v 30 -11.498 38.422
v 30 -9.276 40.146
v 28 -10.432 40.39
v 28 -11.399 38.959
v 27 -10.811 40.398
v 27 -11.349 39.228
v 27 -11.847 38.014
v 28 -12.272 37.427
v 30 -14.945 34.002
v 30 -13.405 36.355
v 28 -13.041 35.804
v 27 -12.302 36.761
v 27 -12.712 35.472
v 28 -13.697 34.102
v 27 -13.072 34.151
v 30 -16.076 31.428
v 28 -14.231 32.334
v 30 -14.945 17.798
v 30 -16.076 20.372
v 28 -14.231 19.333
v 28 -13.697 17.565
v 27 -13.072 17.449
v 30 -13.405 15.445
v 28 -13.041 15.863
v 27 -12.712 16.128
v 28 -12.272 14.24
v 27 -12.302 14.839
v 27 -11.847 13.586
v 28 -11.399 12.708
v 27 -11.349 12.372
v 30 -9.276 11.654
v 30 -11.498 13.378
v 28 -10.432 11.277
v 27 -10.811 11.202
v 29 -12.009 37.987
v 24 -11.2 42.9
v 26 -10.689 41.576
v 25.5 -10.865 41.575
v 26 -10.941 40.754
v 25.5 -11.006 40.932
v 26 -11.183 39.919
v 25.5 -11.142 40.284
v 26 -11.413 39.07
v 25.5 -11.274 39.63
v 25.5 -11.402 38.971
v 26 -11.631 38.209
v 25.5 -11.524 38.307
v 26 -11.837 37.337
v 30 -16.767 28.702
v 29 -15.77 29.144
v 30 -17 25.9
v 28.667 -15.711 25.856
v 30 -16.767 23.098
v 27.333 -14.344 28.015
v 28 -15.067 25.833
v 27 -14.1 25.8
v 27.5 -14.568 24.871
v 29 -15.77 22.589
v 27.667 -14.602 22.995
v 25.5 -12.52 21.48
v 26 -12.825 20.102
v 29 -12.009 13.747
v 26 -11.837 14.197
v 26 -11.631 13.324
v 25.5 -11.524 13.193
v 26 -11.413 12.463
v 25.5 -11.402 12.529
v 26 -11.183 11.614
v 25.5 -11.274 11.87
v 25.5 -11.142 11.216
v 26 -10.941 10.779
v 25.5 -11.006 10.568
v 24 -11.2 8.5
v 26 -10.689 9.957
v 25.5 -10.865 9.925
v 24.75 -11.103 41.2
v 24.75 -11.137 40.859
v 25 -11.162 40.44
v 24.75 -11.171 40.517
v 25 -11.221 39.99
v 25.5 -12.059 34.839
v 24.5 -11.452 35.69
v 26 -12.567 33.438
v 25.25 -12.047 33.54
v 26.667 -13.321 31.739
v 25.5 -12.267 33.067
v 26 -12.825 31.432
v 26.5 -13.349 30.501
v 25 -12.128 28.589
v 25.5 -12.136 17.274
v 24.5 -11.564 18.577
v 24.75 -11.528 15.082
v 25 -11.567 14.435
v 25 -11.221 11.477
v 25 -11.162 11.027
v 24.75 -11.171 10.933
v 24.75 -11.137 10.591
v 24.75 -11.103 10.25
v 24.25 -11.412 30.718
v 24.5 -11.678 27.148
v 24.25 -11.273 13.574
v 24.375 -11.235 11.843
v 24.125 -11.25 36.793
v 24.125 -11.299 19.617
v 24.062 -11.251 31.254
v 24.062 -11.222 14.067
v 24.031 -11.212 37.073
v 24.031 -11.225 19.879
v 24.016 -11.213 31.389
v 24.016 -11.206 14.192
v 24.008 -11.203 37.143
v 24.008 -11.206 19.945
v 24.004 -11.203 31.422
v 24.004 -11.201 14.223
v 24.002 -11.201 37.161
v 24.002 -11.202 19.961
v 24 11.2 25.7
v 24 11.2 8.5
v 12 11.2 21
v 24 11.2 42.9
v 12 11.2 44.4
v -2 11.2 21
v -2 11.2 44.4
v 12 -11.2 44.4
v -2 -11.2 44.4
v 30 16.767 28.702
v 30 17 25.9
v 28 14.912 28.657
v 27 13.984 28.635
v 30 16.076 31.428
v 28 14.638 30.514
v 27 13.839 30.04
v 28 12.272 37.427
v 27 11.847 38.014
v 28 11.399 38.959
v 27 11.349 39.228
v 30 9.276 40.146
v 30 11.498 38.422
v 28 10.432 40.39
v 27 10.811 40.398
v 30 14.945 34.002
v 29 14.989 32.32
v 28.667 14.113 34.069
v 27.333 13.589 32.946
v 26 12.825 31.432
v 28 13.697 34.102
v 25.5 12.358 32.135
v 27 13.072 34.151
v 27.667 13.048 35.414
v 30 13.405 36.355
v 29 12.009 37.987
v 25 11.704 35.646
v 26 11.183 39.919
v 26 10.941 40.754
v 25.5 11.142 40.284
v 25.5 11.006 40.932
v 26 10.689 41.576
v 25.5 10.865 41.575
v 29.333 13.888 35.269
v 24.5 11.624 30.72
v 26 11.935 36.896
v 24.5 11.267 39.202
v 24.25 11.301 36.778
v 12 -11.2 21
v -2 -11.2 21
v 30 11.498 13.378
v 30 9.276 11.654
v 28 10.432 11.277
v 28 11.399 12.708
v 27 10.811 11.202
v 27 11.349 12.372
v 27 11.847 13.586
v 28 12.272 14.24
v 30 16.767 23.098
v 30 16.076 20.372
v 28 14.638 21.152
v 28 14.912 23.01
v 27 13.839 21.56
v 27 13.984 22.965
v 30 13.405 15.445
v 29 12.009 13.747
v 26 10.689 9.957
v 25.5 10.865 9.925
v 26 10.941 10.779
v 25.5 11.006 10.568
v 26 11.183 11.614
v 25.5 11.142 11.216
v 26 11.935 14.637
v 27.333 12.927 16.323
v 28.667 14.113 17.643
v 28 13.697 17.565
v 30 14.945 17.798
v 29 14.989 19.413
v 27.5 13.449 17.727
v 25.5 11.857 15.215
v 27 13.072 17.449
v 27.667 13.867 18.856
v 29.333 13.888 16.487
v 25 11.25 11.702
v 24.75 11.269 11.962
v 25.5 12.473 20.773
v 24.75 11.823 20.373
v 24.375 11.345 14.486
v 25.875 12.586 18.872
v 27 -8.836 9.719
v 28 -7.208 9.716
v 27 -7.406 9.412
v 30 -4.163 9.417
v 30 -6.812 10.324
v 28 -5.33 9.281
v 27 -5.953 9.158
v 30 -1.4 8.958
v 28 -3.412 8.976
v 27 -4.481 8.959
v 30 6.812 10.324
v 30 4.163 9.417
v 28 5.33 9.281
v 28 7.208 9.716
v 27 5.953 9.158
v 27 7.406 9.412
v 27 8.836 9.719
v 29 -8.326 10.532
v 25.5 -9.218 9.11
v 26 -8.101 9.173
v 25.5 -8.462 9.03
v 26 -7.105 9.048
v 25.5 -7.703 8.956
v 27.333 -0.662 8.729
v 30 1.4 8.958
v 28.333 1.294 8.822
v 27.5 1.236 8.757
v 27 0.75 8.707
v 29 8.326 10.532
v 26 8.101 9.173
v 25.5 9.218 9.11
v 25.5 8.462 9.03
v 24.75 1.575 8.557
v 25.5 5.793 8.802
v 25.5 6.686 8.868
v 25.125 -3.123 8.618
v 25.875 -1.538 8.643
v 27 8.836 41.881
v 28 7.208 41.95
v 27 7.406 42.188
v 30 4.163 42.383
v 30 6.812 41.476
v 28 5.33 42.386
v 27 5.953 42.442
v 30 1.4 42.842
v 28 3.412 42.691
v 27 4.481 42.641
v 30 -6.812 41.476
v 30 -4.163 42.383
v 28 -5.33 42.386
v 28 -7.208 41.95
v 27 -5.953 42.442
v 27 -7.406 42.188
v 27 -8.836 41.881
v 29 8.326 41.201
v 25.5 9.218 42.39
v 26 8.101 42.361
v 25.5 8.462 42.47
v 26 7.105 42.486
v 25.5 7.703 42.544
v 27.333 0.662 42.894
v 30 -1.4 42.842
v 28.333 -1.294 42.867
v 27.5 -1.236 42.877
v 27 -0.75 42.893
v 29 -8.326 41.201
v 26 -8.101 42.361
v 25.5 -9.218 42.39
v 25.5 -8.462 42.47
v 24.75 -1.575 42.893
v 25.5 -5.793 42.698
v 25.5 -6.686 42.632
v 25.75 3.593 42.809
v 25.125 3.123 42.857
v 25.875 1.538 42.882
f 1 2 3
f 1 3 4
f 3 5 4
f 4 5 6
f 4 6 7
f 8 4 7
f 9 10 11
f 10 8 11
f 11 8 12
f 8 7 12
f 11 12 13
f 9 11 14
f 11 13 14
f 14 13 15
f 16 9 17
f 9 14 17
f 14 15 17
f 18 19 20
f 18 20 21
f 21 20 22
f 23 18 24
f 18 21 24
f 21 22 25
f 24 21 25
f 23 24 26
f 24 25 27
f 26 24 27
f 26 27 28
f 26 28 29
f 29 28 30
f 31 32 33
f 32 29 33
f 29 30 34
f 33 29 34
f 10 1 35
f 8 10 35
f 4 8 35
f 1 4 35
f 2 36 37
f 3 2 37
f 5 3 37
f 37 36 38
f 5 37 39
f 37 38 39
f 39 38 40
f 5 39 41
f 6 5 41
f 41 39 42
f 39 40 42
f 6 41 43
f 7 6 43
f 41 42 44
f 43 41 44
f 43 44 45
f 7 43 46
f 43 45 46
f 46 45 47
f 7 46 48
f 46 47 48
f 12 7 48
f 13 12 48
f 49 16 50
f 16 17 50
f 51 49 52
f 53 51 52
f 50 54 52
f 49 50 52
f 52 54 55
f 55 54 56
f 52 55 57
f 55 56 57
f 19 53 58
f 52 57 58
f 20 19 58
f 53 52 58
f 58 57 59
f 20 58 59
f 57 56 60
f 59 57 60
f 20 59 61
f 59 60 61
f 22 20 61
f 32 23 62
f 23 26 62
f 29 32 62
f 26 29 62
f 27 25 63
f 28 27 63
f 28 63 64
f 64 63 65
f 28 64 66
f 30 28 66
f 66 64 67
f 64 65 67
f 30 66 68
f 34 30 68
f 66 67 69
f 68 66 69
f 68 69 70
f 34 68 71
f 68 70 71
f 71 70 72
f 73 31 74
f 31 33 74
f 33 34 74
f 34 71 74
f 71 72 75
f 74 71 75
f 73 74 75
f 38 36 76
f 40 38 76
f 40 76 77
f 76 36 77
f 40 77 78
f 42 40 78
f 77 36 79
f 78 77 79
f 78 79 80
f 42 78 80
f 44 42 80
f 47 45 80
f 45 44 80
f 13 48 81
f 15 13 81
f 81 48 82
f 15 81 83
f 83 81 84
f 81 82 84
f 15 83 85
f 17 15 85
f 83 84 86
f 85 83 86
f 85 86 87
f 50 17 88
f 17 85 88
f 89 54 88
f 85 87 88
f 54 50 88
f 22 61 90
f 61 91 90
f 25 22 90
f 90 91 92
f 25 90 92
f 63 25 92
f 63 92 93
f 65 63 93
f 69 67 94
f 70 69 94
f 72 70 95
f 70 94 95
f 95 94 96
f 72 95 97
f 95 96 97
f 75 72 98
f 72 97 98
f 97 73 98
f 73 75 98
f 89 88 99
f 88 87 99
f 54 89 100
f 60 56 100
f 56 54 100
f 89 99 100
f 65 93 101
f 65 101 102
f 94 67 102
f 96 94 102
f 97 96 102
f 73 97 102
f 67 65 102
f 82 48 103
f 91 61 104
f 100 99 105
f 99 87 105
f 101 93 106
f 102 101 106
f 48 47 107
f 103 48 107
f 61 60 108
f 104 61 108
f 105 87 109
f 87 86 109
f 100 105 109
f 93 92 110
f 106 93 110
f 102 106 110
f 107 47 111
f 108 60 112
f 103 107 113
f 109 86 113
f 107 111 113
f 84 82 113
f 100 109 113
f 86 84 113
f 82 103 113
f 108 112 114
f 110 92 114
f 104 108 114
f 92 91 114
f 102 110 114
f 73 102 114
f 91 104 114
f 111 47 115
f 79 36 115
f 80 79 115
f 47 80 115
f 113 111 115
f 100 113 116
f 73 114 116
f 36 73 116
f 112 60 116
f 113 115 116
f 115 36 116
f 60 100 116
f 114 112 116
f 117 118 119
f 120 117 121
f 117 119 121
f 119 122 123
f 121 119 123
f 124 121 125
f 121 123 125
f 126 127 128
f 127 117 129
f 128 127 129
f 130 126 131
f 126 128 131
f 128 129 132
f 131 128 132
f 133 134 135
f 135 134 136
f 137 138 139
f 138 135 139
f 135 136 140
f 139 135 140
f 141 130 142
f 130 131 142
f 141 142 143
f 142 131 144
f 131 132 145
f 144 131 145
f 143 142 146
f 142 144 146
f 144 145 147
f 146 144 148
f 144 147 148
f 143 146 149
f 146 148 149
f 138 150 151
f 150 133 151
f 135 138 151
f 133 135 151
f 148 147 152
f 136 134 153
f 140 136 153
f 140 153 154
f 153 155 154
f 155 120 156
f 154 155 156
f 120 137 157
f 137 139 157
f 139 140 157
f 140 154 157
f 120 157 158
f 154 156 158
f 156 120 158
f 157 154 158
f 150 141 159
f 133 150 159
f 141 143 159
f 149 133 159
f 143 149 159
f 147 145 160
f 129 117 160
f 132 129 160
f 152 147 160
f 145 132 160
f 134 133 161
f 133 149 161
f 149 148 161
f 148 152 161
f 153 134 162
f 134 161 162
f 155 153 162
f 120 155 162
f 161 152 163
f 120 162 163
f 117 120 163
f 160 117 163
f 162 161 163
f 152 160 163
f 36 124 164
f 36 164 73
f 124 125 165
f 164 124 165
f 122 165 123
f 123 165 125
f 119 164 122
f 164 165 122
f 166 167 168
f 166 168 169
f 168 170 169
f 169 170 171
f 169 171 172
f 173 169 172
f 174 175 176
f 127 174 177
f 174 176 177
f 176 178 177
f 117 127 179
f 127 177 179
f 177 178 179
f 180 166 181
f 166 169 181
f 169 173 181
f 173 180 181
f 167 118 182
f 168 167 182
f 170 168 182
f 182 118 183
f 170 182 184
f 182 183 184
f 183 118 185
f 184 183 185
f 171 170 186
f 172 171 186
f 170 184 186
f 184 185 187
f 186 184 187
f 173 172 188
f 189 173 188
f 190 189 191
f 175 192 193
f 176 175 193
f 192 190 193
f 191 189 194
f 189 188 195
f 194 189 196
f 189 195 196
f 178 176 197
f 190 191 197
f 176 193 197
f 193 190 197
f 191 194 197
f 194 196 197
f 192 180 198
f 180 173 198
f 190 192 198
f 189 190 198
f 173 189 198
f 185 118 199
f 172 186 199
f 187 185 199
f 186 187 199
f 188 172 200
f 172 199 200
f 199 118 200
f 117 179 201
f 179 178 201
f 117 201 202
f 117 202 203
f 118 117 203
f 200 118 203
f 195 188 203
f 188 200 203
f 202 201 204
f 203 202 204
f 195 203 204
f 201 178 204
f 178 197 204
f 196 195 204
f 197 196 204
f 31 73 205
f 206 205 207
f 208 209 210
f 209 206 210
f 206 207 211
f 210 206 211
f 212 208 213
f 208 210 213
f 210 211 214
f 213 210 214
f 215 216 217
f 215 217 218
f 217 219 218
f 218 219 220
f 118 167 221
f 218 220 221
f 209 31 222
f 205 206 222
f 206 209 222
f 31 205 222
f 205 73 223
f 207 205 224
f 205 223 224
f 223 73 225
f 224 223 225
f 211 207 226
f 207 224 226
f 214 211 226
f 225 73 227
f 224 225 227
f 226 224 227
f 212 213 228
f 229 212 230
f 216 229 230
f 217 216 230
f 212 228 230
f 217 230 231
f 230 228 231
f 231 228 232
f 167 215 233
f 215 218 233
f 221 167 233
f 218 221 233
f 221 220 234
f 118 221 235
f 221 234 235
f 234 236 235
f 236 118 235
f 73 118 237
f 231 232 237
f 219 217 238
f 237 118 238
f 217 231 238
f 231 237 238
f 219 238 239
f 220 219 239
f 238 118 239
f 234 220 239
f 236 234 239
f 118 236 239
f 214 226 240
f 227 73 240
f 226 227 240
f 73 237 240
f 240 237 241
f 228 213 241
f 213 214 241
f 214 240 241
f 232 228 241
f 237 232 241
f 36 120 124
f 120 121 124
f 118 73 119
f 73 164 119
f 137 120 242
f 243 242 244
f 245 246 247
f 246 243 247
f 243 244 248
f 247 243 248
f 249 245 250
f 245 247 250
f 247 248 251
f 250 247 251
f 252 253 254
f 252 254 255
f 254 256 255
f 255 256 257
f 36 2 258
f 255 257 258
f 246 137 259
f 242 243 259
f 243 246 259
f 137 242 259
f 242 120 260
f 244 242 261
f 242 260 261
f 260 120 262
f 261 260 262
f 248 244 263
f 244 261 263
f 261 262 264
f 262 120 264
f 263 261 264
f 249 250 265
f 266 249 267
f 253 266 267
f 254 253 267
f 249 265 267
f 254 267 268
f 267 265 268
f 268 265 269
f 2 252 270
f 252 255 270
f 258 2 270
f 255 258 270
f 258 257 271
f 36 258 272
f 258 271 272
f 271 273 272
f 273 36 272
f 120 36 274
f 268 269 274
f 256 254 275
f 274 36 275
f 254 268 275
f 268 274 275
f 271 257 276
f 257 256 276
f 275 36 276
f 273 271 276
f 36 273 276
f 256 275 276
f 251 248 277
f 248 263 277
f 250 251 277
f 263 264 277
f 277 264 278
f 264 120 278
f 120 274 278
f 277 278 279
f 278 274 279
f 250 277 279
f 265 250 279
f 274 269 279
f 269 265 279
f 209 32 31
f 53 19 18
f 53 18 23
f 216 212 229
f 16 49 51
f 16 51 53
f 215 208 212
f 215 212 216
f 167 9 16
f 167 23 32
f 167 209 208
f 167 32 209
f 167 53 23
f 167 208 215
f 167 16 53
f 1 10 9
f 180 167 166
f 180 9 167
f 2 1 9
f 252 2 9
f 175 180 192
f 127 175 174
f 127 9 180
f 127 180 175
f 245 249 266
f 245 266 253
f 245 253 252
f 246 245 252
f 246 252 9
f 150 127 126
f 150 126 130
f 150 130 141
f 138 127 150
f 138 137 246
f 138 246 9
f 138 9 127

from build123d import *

# Parameters (mm, degrees)
SKETCH073_W = 22.4
SKETCH073_H = 34.4
SKETCH074_W = 22.4
SKETCH074_H = 23.4
SKETCH075_W = 22.4
SKETCH075_H = 23.4
SKETCH072_R = 17
SKETCH076_W = 22.4
SKETCH076_H = 34.4


with BuildPart() as loft008:
    # Sketch073 → Loft008 section 0
    with BuildSketch(Plane(origin=(24, 0, 19.5), x_dir=(0, 1, 0), z_dir=(1, 0, 0))):
        with Locations((0, 6.2)):
            Rectangle(SKETCH073_W, SKETCH073_H)
    # Sketch074 → Loft008 section 1
    with BuildSketch(Plane(origin=(12, 0, 19.5), x_dir=(0, 1, 0), z_dir=(1, 0, 0))):
        with Locations((0, 13.2)):
            Rectangle(SKETCH074_W, SKETCH074_H)
    # Sketch075 → Loft008 section 2
    with BuildSketch(Plane(origin=(-2, 0, 19.5), x_dir=(0, 1, 0), z_dir=(1, 0, 0))):
        with Locations((0, 13.2)):
            Rectangle(SKETCH075_W, SKETCH075_H)
    loft(ruled=True)


with BuildPart() as fusion005:
    # Sketch072 → Loft007 section 0
    with BuildSketch(Plane(origin=(30, 0, 19.5), x_dir=(0, 1, 0), z_dir=(1, 0, 0))):
        with Locations((0, 6.4)):
            Circle(SKETCH072_R)
    # Sketch076 → Loft007 section 1
    with BuildSketch(Plane(origin=(24, 0, 19.5), x_dir=(0, 1, 0), z_dir=(1, 0, 0))):
        with Locations((0, 6.2)):
            Rectangle(SKETCH076_W, SKETCH076_H)
    loft()

    # Fusion005: union Loft008
    add(loft008.part)


solid = fusion005.part
